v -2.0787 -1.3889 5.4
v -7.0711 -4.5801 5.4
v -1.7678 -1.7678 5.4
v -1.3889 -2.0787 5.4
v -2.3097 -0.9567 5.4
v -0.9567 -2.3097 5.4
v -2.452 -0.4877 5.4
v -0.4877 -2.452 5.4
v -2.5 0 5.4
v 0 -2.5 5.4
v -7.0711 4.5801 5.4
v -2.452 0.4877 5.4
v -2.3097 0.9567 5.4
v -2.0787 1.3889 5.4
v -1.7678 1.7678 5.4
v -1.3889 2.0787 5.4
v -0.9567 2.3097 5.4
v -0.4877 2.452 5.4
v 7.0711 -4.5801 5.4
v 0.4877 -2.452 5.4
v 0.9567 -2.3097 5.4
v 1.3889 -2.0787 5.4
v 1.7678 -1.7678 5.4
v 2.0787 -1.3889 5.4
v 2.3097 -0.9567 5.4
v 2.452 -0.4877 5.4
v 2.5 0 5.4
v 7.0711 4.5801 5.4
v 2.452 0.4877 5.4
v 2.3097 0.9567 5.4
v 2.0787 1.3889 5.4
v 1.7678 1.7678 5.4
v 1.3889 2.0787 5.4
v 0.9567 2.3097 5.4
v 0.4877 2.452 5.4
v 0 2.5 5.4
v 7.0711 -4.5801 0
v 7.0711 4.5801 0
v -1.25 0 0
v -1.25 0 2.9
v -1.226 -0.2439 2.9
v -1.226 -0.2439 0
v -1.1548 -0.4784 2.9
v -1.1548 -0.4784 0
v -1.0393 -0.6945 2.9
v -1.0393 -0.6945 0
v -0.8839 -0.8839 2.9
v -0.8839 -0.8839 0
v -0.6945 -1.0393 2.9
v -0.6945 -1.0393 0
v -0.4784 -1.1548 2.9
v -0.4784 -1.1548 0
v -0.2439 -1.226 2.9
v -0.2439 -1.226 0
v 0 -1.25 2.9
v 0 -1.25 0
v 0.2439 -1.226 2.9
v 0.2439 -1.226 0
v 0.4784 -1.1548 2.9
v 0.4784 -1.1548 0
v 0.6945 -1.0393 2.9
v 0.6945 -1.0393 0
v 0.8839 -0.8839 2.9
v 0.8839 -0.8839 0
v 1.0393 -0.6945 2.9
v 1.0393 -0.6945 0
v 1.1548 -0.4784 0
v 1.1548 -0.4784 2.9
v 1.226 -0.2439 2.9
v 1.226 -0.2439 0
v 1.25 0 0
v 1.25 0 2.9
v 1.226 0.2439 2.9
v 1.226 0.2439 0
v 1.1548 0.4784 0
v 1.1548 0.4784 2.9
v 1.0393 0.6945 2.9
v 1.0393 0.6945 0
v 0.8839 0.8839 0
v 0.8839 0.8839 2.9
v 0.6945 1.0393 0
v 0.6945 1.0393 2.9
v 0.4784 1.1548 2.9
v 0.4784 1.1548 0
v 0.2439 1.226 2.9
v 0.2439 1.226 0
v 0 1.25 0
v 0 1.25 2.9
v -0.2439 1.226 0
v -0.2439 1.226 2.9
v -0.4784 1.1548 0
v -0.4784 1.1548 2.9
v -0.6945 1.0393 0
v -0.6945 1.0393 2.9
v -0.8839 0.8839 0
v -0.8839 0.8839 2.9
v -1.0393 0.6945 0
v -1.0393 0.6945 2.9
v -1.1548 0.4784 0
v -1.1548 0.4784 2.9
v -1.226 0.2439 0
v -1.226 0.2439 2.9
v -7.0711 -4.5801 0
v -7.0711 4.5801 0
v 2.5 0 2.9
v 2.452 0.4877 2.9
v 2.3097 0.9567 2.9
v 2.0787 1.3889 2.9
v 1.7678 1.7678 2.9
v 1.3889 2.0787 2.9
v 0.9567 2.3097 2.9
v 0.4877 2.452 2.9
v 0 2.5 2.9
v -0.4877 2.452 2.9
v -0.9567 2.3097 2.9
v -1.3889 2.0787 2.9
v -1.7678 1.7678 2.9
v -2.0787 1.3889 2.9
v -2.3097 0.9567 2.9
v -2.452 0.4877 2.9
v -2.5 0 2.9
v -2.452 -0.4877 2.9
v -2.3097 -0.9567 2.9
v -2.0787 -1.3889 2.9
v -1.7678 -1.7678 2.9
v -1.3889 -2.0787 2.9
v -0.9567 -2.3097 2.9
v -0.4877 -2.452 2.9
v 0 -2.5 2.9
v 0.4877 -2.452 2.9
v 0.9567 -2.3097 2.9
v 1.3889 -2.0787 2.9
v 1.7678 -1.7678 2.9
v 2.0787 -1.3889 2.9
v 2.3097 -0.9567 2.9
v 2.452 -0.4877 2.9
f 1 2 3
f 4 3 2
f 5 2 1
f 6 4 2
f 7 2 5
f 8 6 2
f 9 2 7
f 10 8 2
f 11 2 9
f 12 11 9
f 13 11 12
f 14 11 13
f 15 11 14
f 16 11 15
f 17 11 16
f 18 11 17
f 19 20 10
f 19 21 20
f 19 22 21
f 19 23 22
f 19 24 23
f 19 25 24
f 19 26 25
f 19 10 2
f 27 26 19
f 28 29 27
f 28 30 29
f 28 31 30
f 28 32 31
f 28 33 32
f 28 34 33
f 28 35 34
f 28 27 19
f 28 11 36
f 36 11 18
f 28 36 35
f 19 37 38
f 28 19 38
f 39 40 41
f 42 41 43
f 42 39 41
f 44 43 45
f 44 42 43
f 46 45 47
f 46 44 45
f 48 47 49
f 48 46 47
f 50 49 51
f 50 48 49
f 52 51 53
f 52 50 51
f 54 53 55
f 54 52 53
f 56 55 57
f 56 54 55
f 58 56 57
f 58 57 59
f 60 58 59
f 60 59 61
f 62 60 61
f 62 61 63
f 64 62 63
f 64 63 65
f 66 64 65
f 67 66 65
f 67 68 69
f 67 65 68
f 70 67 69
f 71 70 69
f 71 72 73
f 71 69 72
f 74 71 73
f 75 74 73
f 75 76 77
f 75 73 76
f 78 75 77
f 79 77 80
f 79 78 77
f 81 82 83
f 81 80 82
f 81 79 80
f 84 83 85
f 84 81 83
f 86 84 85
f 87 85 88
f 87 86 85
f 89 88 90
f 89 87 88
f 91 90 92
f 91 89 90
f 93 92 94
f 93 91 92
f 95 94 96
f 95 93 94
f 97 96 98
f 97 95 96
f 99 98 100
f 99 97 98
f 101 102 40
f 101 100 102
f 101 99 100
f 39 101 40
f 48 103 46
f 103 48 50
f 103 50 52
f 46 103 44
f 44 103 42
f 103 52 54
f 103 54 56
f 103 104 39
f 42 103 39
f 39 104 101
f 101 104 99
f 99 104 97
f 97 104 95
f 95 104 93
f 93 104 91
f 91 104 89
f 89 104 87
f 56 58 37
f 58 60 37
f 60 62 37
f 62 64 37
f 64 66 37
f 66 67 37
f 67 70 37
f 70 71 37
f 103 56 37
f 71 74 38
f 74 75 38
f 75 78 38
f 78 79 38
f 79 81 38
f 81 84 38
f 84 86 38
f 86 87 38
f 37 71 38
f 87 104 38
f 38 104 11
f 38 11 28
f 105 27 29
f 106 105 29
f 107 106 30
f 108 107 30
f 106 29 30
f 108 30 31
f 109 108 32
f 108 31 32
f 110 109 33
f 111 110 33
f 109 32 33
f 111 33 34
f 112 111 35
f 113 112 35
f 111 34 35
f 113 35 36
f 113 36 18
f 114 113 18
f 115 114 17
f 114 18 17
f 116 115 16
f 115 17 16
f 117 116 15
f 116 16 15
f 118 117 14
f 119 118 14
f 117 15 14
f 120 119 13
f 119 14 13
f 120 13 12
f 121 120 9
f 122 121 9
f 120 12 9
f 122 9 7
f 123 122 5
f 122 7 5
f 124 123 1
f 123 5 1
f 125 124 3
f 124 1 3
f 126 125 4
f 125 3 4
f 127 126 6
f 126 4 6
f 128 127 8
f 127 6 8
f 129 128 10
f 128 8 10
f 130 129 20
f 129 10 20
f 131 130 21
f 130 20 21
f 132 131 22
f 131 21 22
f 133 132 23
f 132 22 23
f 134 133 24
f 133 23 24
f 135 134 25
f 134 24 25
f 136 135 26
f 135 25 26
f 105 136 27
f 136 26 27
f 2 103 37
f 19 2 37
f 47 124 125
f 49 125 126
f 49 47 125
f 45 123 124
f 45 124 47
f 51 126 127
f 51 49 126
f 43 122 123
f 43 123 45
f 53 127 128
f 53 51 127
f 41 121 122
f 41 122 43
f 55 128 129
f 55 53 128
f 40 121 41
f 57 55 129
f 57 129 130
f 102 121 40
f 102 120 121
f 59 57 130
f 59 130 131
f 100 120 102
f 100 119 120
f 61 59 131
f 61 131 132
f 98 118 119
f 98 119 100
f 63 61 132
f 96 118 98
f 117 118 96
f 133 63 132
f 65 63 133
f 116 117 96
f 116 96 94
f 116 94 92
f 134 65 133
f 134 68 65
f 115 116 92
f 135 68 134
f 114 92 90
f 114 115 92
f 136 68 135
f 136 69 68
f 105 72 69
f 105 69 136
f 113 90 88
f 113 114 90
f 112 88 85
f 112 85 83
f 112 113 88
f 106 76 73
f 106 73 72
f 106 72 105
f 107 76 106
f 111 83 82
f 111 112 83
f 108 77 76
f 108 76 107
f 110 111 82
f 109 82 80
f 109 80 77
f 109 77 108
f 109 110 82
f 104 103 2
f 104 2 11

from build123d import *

# Parameters (mm, degrees)
SKETCH1_W           = 14.142143214
SKETCH1_H           = 9.160251854
SKETCH1_R           = 1.25
BOSS_EXTRUDE1_DEPTH = 5.4
SKETCH2_R           = 2.5
CUT_EXTRUDE1_DEPTH  = 2.5


with BuildPart() as part:
    # Sketch1 → Boss-Extrude1 (new body)
    with BuildSketch(Plane.XY):
        Rectangle(SKETCH1_W, SKETCH1_H)
        with Locations(Location((0, 0, 0), (0, 0, 180))):
            Circle(SKETCH1_R, mode=Mode.SUBTRACT)
    extrude(amount=BOSS_EXTRUDE1_DEPTH)

    # Sketch2 → Cut-Extrude1 (cut)
    with BuildSketch(Plane.XY.offset(5.4)):
        Circle(SKETCH2_R)
    extrude(amount=-CUT_EXTRUDE1_DEPTH, mode=Mode.SUBTRACT)


solid = part.part
